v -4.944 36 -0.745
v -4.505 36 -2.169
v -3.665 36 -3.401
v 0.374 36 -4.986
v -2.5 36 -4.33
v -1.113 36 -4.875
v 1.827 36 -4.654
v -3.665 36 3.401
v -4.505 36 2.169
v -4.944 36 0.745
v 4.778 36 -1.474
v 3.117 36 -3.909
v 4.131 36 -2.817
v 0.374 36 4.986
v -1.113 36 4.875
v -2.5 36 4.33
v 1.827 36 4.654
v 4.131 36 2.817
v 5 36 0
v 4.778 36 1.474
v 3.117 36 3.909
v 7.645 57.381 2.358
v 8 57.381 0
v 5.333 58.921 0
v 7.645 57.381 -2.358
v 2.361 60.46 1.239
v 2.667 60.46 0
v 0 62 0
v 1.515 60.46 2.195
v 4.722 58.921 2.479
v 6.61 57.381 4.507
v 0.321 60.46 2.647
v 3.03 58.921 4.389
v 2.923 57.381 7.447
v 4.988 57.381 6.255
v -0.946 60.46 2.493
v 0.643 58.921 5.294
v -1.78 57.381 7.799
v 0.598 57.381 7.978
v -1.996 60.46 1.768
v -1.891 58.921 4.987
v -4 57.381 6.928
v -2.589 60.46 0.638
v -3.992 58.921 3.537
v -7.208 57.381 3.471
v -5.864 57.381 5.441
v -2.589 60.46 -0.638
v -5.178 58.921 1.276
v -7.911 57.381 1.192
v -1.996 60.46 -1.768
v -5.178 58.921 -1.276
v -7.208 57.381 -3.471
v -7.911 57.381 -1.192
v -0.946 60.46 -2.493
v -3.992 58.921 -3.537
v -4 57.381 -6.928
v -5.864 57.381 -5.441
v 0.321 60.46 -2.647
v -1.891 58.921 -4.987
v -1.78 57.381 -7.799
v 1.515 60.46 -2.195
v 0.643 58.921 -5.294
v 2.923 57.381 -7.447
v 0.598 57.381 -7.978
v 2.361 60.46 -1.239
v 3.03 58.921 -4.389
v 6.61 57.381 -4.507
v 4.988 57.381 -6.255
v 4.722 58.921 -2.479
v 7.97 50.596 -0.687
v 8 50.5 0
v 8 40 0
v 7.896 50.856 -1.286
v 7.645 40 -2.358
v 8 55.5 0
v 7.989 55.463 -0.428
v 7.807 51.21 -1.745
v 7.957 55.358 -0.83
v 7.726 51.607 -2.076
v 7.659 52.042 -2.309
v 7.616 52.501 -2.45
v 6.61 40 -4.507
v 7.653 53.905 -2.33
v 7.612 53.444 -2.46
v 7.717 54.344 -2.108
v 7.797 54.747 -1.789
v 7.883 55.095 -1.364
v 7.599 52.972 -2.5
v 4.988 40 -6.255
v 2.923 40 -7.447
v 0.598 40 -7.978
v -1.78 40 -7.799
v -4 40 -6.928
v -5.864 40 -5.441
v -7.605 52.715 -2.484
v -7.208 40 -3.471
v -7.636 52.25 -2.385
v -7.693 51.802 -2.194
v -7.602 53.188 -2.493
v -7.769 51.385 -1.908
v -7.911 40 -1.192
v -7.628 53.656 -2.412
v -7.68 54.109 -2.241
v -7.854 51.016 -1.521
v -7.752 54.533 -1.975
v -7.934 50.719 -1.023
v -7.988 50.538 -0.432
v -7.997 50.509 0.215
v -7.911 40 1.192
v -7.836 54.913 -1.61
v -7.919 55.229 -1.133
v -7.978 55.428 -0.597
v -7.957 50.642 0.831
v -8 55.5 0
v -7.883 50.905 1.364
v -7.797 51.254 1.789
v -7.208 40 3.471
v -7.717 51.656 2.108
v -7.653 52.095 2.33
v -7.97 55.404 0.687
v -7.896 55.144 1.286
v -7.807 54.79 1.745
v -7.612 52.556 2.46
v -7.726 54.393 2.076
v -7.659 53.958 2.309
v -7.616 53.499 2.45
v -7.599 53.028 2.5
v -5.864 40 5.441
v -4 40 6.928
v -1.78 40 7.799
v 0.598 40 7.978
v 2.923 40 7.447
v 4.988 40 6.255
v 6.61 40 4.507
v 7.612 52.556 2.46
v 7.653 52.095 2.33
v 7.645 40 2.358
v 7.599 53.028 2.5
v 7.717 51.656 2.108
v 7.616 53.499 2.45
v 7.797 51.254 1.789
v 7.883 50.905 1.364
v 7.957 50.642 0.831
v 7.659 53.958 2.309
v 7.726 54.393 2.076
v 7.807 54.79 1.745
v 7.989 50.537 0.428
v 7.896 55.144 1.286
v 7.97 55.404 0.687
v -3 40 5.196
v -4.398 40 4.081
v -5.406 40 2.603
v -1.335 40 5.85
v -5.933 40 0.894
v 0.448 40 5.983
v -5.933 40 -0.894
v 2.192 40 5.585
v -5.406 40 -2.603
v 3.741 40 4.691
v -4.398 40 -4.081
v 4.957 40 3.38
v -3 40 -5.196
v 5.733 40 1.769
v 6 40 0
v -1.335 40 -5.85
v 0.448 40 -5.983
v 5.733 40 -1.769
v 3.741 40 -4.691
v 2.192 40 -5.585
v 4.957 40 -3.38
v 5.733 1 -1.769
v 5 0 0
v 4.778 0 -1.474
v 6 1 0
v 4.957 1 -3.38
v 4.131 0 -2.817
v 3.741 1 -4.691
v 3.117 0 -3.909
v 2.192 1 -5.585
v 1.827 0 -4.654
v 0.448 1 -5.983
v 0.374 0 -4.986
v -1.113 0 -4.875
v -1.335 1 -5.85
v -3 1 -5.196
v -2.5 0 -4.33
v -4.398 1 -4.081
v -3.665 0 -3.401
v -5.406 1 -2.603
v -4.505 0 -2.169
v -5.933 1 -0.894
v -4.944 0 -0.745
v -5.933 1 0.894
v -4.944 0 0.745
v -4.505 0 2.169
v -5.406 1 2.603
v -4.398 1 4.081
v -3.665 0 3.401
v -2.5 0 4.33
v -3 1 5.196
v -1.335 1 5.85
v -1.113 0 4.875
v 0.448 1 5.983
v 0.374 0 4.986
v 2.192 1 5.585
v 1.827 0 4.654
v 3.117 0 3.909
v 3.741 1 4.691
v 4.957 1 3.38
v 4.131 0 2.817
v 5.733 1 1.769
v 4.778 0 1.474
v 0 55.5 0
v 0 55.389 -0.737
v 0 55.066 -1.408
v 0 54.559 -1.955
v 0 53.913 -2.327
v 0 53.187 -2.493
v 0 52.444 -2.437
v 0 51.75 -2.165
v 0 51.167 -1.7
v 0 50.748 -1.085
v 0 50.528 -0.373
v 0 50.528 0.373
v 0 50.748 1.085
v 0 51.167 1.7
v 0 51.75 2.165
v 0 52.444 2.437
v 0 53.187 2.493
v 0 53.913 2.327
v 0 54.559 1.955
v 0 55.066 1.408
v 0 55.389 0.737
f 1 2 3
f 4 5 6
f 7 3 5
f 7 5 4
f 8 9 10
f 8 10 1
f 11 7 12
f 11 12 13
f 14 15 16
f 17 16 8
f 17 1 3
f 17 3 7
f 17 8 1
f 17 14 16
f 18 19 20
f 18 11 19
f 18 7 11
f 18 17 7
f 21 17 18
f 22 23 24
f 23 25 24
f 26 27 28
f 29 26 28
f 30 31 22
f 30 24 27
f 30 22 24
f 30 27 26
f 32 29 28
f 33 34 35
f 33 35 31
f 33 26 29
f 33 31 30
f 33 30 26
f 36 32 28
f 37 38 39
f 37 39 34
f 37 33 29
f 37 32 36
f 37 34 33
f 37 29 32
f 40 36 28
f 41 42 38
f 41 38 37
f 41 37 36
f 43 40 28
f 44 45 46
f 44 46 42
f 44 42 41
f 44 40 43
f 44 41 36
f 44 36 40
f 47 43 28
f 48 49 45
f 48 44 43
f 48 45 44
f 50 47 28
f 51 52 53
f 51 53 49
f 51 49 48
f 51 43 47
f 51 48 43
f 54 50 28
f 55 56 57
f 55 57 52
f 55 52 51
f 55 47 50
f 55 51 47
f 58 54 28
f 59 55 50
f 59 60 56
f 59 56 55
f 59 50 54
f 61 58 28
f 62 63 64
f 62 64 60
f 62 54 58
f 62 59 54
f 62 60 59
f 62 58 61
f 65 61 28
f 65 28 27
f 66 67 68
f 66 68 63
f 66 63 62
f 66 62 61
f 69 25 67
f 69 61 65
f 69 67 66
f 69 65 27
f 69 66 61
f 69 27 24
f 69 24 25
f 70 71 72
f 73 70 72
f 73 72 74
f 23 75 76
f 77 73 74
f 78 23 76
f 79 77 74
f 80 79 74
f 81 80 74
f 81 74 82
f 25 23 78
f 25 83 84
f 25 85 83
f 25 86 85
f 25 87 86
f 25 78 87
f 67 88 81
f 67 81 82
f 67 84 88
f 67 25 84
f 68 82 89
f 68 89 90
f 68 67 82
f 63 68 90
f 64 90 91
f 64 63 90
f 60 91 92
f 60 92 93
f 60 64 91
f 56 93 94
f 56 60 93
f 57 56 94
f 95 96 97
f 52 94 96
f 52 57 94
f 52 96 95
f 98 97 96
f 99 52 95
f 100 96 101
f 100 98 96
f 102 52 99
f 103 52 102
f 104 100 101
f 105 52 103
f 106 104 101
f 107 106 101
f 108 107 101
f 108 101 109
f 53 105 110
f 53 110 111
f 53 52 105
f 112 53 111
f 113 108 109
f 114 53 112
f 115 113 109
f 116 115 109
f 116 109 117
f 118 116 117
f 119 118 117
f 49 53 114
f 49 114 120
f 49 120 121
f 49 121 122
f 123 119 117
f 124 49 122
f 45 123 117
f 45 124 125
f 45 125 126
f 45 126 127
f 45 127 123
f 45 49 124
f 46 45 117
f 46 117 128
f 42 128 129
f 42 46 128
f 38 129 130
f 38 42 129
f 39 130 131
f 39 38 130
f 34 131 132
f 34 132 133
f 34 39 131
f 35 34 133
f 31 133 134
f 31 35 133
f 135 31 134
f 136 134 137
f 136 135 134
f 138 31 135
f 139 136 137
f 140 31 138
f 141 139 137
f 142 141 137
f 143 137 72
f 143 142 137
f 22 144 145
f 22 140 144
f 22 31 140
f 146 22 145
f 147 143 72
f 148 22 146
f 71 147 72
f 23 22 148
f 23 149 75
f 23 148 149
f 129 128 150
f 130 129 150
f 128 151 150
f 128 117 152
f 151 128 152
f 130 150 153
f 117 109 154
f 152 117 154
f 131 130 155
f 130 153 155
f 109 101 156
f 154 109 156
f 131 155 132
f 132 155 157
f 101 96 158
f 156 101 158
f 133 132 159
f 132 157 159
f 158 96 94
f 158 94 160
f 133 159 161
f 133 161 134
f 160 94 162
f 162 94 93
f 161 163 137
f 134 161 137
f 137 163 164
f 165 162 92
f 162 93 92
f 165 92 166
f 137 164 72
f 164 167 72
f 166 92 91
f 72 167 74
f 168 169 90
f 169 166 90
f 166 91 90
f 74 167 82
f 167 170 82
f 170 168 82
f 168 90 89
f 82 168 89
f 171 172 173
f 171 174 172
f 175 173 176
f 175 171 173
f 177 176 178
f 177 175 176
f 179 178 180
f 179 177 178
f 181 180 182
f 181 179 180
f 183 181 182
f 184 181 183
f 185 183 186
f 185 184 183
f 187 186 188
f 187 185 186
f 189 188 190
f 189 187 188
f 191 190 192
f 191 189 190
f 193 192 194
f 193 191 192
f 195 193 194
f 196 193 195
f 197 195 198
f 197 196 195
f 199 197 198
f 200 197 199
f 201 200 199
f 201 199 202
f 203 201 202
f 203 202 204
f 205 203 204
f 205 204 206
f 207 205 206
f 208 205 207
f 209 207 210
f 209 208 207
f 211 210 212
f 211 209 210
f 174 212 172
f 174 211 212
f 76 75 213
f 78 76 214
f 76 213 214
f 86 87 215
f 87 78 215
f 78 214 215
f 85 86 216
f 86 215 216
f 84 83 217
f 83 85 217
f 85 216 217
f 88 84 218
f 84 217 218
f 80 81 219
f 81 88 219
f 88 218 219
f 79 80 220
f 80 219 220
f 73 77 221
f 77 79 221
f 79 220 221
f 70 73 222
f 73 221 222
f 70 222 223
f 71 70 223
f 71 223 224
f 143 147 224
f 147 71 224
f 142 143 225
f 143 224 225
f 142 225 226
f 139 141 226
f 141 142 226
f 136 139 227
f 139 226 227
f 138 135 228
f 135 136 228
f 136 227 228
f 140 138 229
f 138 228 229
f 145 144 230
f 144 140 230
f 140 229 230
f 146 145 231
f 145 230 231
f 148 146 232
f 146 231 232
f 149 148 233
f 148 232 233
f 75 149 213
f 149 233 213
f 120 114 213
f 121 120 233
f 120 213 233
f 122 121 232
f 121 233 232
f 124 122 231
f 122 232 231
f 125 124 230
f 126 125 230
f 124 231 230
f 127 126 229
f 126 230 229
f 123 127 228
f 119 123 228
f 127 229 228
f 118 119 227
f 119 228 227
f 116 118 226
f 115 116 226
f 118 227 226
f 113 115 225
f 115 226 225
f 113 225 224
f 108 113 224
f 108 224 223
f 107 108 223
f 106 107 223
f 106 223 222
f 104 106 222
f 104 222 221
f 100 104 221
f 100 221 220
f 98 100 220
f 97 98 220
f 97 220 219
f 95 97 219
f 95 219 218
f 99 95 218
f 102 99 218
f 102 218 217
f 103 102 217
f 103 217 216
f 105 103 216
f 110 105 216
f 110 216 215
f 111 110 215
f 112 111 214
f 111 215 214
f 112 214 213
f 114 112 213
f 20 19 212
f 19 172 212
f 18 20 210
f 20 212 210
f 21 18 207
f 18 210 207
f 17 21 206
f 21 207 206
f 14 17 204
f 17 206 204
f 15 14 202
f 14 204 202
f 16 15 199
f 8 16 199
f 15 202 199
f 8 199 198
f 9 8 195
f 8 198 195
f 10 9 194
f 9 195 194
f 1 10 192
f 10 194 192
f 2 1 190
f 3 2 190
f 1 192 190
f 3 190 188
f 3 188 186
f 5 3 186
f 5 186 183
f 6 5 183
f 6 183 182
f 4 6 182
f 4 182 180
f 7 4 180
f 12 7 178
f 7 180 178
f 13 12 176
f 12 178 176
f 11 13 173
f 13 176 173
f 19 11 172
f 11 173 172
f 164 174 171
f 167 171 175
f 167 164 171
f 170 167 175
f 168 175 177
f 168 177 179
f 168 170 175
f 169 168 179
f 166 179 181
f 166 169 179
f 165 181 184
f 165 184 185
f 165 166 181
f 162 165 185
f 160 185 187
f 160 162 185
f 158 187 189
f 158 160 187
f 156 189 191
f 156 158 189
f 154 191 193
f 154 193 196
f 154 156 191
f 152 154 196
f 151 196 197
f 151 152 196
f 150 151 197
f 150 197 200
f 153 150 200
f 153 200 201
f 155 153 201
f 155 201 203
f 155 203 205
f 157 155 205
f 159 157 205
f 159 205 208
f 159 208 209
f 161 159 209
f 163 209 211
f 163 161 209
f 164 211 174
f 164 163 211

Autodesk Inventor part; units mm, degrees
ref_plane "YZ Plane" through (0, 0, 0) normal (1, 0, 0) x (0, 1, 0)
ref_plane "XZ Plane" through (0, 0, 0) normal (0, 1, 0) x (-1, 0, 0)
ref_plane "XY Plane" through (0, 0, 0) normal (0, 0, 1) x (1, 0, 0)
sketch "草圖1" plane through (0, 0, 0) normal (0, 0, 1) x (1, 0, 0)
  line L0 (0, 0) -> (6, 0)
  line L1 (6, 0) -> (6, 40)
  line L2 (6, 40) -> (8, 40)
  line L3 (8, 40) -> (8, 57.3812)
  line L4 (0, 62) -> (0, 64.8191)
  line L5 (0, 62) -> (8, 57.3812)
  line L6 (0, 0) -> (0, 62)
  dimension "d0" = 6
  dimension "d1" = 40
  dimension "d3" = 2
  dimension "d6" = 60
  dimension "d7" = 0
  dimension "d8" = 62
revolve "迴轉1" add sketch "草圖1" angle 360 about axis through (0, 62, 0) along (0, 1, 0)
chamfer "倒角1" distance 1 distance2 1 1 edges at (-6, 0, 0) measured on face at (-3.0269, 0, 1.5886)
sketch "草圖2" plane through (0, 0, 0) normal (0, -1, 0) x (1, 0, 0)
  circle A0 centre (0, 0) radius 5
extrude "擠出1" cut sketch "草圖2" against normal blind 36
sketch "草圖4" plane through (0, 0, 0) normal (1, 0, 0) x (0, 1, 0)
  circle A0 centre (53, 0) radius 2.5
  line L0 (40, 8) -> (40, -8) projected
  point P0 (0, 0)
  dimension "d17" = 13
  dimension "d18" = 5
  dimension "d19" = 0
extrude "擠出2" cut sketch "草圖4" along normal through all both and the other way through all
thread "螺紋2" size "M12x1.75" class "6g" standard "ANSI Metric M Profile" full length
thread "螺紋3" size "M6x1" class "6H" standard "ANSI Metric M Profile" full length
properties part number "B"
